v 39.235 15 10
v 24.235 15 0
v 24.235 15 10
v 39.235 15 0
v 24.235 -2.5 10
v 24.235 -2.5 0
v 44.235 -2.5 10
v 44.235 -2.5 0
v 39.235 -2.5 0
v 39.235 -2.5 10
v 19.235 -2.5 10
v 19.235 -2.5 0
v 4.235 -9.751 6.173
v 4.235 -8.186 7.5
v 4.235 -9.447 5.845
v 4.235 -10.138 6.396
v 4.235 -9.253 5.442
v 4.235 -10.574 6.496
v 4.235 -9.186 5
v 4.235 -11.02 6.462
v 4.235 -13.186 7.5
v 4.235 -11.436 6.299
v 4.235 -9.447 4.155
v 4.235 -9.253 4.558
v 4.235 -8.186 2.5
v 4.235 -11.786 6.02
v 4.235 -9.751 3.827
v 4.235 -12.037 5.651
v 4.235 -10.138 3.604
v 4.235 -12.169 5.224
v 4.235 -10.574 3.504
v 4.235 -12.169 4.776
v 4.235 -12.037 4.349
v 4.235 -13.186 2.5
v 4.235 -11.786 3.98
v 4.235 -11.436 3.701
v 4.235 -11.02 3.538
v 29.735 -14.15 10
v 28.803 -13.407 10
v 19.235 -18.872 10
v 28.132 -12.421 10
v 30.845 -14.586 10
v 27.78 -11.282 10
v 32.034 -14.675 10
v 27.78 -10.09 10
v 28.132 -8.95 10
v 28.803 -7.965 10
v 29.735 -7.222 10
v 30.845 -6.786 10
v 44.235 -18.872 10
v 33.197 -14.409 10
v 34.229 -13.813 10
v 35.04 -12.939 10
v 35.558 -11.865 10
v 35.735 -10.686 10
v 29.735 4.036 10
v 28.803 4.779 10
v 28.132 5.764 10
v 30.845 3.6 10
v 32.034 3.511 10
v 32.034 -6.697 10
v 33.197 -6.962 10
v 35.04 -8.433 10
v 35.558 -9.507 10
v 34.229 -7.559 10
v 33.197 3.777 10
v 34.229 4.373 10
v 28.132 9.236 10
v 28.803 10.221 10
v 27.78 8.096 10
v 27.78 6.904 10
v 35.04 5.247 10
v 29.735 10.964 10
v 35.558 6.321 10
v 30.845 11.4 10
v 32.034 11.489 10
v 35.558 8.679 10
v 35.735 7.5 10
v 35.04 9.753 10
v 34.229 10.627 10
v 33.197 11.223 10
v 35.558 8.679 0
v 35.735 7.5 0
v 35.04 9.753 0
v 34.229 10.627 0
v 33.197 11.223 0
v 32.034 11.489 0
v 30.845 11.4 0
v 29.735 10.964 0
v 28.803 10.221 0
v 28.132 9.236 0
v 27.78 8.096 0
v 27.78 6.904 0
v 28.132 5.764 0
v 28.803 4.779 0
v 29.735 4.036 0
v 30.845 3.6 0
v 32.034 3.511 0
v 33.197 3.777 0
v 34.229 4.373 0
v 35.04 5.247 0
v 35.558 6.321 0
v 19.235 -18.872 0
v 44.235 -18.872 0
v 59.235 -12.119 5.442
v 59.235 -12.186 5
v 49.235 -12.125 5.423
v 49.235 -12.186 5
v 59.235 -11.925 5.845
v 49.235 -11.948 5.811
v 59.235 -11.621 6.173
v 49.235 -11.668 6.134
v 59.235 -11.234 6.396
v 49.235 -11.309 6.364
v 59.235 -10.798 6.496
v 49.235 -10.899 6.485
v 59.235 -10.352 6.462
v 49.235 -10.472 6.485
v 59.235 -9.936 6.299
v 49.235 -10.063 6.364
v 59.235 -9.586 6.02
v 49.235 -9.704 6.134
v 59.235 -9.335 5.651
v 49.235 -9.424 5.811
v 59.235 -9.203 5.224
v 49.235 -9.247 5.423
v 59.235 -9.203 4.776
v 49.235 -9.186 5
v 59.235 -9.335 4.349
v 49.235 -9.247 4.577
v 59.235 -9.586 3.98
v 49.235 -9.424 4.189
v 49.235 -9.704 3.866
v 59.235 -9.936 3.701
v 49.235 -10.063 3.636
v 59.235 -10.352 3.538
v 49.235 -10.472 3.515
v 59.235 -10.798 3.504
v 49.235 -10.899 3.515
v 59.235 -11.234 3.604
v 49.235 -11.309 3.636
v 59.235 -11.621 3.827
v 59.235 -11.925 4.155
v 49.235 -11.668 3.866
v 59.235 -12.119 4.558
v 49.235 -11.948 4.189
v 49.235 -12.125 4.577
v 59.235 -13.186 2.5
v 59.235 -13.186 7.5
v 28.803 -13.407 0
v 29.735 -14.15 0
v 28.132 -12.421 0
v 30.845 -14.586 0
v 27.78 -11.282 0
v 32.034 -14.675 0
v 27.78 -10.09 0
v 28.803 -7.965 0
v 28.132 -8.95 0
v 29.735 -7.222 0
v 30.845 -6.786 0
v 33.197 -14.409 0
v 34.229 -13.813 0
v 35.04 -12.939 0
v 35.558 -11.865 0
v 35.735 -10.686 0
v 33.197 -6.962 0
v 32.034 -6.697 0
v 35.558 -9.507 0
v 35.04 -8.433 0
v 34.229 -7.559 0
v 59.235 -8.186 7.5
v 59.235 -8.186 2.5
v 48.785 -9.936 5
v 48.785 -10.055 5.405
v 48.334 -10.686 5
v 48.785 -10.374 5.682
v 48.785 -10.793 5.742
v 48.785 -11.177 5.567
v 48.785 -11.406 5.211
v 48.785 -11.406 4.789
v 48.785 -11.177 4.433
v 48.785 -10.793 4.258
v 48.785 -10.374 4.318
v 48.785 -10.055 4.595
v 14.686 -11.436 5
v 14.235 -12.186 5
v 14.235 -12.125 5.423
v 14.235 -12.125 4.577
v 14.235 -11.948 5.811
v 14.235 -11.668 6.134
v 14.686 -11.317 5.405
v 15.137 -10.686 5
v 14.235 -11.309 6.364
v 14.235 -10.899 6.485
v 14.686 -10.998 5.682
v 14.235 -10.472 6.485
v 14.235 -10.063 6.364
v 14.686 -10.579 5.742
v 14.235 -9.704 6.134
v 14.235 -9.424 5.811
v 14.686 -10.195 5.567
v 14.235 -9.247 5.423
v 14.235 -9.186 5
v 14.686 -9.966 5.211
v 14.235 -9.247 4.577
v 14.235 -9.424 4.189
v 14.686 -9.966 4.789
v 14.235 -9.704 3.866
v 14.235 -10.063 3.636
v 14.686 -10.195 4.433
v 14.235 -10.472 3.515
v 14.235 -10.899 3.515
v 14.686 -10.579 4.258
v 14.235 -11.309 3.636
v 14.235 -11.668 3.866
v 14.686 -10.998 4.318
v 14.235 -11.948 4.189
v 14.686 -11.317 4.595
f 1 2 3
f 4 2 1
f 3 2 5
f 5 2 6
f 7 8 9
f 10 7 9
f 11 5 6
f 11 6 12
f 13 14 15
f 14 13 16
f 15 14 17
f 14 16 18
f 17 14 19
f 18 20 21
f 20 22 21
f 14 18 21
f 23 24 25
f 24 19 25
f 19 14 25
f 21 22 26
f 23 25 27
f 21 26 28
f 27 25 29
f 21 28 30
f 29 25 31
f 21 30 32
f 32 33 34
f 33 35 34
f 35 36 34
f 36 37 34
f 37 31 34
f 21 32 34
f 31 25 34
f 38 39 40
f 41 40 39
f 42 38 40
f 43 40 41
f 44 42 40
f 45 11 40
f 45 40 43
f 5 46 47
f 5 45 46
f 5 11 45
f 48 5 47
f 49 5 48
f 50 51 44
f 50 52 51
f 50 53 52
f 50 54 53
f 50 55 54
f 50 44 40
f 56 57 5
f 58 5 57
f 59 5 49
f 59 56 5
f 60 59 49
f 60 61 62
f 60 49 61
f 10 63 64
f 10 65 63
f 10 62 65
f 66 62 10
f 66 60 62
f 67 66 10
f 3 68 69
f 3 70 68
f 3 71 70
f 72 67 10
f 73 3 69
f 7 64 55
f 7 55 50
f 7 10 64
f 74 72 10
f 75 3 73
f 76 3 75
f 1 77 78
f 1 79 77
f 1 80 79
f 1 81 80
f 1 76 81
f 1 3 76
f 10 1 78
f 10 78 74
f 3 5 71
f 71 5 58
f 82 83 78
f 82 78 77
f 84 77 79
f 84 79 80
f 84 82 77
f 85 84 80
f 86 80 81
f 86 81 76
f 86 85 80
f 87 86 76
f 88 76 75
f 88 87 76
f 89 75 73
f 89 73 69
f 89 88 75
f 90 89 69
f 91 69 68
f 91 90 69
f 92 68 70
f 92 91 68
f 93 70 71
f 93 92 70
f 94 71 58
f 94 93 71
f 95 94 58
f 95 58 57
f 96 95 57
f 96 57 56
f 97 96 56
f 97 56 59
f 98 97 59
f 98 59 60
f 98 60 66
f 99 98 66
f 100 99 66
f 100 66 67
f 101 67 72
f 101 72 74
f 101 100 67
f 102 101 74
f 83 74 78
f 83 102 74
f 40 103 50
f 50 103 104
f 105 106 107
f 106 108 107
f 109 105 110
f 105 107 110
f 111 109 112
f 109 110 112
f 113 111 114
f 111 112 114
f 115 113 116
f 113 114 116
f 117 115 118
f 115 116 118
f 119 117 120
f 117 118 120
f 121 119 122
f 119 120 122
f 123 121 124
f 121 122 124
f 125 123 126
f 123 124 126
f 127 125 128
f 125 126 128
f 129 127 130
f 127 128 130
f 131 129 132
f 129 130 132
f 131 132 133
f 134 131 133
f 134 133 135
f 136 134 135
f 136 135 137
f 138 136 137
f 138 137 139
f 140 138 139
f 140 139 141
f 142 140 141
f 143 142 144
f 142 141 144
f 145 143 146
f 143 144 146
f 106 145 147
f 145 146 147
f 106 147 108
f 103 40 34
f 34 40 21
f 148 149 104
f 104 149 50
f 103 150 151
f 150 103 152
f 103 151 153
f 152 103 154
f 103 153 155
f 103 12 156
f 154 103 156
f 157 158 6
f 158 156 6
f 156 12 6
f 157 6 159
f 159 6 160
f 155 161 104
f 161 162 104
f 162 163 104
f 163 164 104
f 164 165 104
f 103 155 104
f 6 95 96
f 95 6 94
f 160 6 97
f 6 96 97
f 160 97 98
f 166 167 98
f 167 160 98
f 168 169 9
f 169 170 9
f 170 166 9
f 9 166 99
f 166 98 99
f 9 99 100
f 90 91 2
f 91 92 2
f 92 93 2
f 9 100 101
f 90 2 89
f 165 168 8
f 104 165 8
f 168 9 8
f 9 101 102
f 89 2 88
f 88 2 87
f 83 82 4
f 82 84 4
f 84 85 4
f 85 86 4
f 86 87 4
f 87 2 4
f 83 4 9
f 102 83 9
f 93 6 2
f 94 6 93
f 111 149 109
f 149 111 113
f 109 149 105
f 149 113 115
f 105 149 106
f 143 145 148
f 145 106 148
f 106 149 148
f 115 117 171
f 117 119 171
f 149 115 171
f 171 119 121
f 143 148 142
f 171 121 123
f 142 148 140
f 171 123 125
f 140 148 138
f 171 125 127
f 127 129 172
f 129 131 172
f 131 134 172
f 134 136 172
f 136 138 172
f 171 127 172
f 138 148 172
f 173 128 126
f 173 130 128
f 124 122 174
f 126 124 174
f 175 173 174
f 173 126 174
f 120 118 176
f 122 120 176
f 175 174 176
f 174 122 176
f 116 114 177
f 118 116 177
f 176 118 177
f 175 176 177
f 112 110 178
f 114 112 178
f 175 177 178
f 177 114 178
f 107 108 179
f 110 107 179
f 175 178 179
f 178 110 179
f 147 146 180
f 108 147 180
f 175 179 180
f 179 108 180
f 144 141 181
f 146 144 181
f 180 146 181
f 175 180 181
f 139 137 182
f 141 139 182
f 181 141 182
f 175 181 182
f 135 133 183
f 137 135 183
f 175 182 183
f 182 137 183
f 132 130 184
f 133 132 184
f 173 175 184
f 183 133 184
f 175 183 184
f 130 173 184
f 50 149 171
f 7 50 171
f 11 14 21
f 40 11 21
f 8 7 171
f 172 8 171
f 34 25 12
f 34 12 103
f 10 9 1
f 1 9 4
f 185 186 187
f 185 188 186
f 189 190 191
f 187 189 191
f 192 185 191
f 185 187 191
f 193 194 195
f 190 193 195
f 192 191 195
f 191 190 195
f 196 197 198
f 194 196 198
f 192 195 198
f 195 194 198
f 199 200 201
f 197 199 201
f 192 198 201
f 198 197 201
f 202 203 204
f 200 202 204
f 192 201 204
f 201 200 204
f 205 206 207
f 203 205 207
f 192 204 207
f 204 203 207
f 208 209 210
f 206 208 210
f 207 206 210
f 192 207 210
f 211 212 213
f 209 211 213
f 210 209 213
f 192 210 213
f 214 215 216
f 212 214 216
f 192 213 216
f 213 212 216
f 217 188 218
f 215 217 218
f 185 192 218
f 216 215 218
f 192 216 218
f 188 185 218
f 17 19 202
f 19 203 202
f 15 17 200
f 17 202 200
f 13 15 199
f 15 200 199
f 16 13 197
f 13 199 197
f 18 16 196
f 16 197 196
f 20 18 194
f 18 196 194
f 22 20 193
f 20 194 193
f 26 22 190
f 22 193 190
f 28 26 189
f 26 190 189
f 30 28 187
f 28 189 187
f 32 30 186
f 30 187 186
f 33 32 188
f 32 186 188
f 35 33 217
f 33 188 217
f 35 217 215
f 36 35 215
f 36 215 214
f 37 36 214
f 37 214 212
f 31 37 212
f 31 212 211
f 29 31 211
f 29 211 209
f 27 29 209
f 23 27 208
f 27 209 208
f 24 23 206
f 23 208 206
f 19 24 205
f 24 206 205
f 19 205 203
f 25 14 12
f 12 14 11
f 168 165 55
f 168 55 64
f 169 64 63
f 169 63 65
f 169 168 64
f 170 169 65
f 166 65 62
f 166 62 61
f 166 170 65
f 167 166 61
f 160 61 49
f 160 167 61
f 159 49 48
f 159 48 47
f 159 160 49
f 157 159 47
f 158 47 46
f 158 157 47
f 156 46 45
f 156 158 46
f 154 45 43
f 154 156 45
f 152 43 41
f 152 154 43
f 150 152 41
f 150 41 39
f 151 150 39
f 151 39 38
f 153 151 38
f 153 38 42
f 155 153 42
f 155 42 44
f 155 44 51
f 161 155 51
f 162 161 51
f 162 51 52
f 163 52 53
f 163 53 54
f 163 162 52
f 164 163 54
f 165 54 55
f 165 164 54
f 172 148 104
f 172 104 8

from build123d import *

# Parameters (mm, degrees)
F0_R           = 4
F0_W           = 15
F0_H           = 15
F1_DEPTH       = 10
F3_DEPTH       = 25
F5_DEPTH       = 25
F6_SIZE2       = 2.5
F6_SIZE        = 15
F6_2_SIZE2     = 2.5
F6_2_SIZE      = 15
F9_D           = 3
F9_DEPTH       = 10
F9_TIP         = 0.9012909285
F9_ON_F7_D     = 3
F9_ON_F7_DEPTH = 10
F9_ON_F7_TIP   = 0.9012909285


with BuildPart() as f1:
    # F0 (on Top) → F1 (new body)
    with BuildSketch(Plane.XY):
        Polygon((59.23548, -2.5), (39.23548, -2.5), (31.73548, -2.5), (24.23548, -2.5), (4.23548, -2.5), (4.23548, -18.87192), (15.86774, -18.87192), (59.23548, -18.87192), align=None)
        with Locations((31.73548, -10.68596)):
            Circle(F0_R, mode=Mode.SUBTRACT)
        Polygon((39.23548, -2.5), (39.23548, 0), (24.23548, 0), (24.23548, -2.5), (31.73548, -2.5), align=None)
        with Locations((31.73548, 7.5)):
            Rectangle(F0_W, F0_H)
        with Locations((31.73548, 7.5)):
            Circle(F0_R, mode=Mode.SUBTRACT)
    extrude(amount=F1_DEPTH)

    # F2 (on face) → F3 (cut)
    with BuildSketch(Plane.XY.offset(10)):
        Polygon((44.23548, -2.5), (59.23548, -8.18596), (59.23548, -2.5), align=None)
        Polygon((59.23548, -18.87192), (59.23548, -13.18596), (44.23548, -18.87192), align=None)
    extrude(amount=-F3_DEPTH, mode=Mode.SUBTRACT)

    # F4 (on face) → F5 (cut)
    with BuildSketch(Plane.XY.offset(10)):
        Polygon((19.23548, -2.5), (4.23548, -2.5), (4.23548, -8.18596), align=None)
        Polygon((4.23548, -18.87192), (19.23548, -18.87192), (4.23548, -13.18596), align=None)
    extrude(amount=-F5_DEPTH, mode=Mode.SUBTRACT)

    # F6
    f6_edges = [f1.edges().sort_by_distance(p)[0] for p in [
        (4.23548, -10.68596, 10),
        (59.23548, -10.68596, 10),
    ]]
    f6_side = f1.faces().sort_by_distance((51.506527, -5.946976, 10))[0]
    chamfer(f6_edges, length=F6_SIZE, length2=F6_SIZE2, reference=f6_side)

    # F6#2
    f6_2_edges = [f1.edges().sort_by_distance(p)[0] for p in [
        (4.23548, -10.68596, 0),
        (59.23548, -10.68596, 0),
    ]]
    f6_2_side = f1.faces().sort_by_distance((51.506527, -5.946976, 0))[0]
    chamfer(f6_2_edges, length=F6_2_SIZE, length2=F6_2_SIZE2, reference=f6_2_side)

    # F9
    with Locations(Plane.YZ.offset(59.23548)):
        with Locations((-10.68596, 5)):
            Hole(F9_D / 2, depth=F9_DEPTH)
            with Locations((0, 0, -(F9_DEPTH + F9_TIP / 2))):  # 118° drill point
                Cone(0, F9_D / 2, F9_TIP, mode=Mode.SUBTRACT)

    # F9 on F7
    with Locations(Plane(origin=(4.23548, 0, 0), x_dir=(0, -1, 0), z_dir=(-1, 0, 0))):
        with Locations((10.68596, 5)):
            Hole(F9_ON_F7_D / 2, depth=F9_ON_F7_DEPTH)
            with Locations((0, 0, -(F9_ON_F7_DEPTH + F9_ON_F7_TIP / 2))):  # 118° drill point
                Cone(0, F9_ON_F7_D / 2, F9_ON_F7_TIP, mode=Mode.SUBTRACT)


solid = f1.part
